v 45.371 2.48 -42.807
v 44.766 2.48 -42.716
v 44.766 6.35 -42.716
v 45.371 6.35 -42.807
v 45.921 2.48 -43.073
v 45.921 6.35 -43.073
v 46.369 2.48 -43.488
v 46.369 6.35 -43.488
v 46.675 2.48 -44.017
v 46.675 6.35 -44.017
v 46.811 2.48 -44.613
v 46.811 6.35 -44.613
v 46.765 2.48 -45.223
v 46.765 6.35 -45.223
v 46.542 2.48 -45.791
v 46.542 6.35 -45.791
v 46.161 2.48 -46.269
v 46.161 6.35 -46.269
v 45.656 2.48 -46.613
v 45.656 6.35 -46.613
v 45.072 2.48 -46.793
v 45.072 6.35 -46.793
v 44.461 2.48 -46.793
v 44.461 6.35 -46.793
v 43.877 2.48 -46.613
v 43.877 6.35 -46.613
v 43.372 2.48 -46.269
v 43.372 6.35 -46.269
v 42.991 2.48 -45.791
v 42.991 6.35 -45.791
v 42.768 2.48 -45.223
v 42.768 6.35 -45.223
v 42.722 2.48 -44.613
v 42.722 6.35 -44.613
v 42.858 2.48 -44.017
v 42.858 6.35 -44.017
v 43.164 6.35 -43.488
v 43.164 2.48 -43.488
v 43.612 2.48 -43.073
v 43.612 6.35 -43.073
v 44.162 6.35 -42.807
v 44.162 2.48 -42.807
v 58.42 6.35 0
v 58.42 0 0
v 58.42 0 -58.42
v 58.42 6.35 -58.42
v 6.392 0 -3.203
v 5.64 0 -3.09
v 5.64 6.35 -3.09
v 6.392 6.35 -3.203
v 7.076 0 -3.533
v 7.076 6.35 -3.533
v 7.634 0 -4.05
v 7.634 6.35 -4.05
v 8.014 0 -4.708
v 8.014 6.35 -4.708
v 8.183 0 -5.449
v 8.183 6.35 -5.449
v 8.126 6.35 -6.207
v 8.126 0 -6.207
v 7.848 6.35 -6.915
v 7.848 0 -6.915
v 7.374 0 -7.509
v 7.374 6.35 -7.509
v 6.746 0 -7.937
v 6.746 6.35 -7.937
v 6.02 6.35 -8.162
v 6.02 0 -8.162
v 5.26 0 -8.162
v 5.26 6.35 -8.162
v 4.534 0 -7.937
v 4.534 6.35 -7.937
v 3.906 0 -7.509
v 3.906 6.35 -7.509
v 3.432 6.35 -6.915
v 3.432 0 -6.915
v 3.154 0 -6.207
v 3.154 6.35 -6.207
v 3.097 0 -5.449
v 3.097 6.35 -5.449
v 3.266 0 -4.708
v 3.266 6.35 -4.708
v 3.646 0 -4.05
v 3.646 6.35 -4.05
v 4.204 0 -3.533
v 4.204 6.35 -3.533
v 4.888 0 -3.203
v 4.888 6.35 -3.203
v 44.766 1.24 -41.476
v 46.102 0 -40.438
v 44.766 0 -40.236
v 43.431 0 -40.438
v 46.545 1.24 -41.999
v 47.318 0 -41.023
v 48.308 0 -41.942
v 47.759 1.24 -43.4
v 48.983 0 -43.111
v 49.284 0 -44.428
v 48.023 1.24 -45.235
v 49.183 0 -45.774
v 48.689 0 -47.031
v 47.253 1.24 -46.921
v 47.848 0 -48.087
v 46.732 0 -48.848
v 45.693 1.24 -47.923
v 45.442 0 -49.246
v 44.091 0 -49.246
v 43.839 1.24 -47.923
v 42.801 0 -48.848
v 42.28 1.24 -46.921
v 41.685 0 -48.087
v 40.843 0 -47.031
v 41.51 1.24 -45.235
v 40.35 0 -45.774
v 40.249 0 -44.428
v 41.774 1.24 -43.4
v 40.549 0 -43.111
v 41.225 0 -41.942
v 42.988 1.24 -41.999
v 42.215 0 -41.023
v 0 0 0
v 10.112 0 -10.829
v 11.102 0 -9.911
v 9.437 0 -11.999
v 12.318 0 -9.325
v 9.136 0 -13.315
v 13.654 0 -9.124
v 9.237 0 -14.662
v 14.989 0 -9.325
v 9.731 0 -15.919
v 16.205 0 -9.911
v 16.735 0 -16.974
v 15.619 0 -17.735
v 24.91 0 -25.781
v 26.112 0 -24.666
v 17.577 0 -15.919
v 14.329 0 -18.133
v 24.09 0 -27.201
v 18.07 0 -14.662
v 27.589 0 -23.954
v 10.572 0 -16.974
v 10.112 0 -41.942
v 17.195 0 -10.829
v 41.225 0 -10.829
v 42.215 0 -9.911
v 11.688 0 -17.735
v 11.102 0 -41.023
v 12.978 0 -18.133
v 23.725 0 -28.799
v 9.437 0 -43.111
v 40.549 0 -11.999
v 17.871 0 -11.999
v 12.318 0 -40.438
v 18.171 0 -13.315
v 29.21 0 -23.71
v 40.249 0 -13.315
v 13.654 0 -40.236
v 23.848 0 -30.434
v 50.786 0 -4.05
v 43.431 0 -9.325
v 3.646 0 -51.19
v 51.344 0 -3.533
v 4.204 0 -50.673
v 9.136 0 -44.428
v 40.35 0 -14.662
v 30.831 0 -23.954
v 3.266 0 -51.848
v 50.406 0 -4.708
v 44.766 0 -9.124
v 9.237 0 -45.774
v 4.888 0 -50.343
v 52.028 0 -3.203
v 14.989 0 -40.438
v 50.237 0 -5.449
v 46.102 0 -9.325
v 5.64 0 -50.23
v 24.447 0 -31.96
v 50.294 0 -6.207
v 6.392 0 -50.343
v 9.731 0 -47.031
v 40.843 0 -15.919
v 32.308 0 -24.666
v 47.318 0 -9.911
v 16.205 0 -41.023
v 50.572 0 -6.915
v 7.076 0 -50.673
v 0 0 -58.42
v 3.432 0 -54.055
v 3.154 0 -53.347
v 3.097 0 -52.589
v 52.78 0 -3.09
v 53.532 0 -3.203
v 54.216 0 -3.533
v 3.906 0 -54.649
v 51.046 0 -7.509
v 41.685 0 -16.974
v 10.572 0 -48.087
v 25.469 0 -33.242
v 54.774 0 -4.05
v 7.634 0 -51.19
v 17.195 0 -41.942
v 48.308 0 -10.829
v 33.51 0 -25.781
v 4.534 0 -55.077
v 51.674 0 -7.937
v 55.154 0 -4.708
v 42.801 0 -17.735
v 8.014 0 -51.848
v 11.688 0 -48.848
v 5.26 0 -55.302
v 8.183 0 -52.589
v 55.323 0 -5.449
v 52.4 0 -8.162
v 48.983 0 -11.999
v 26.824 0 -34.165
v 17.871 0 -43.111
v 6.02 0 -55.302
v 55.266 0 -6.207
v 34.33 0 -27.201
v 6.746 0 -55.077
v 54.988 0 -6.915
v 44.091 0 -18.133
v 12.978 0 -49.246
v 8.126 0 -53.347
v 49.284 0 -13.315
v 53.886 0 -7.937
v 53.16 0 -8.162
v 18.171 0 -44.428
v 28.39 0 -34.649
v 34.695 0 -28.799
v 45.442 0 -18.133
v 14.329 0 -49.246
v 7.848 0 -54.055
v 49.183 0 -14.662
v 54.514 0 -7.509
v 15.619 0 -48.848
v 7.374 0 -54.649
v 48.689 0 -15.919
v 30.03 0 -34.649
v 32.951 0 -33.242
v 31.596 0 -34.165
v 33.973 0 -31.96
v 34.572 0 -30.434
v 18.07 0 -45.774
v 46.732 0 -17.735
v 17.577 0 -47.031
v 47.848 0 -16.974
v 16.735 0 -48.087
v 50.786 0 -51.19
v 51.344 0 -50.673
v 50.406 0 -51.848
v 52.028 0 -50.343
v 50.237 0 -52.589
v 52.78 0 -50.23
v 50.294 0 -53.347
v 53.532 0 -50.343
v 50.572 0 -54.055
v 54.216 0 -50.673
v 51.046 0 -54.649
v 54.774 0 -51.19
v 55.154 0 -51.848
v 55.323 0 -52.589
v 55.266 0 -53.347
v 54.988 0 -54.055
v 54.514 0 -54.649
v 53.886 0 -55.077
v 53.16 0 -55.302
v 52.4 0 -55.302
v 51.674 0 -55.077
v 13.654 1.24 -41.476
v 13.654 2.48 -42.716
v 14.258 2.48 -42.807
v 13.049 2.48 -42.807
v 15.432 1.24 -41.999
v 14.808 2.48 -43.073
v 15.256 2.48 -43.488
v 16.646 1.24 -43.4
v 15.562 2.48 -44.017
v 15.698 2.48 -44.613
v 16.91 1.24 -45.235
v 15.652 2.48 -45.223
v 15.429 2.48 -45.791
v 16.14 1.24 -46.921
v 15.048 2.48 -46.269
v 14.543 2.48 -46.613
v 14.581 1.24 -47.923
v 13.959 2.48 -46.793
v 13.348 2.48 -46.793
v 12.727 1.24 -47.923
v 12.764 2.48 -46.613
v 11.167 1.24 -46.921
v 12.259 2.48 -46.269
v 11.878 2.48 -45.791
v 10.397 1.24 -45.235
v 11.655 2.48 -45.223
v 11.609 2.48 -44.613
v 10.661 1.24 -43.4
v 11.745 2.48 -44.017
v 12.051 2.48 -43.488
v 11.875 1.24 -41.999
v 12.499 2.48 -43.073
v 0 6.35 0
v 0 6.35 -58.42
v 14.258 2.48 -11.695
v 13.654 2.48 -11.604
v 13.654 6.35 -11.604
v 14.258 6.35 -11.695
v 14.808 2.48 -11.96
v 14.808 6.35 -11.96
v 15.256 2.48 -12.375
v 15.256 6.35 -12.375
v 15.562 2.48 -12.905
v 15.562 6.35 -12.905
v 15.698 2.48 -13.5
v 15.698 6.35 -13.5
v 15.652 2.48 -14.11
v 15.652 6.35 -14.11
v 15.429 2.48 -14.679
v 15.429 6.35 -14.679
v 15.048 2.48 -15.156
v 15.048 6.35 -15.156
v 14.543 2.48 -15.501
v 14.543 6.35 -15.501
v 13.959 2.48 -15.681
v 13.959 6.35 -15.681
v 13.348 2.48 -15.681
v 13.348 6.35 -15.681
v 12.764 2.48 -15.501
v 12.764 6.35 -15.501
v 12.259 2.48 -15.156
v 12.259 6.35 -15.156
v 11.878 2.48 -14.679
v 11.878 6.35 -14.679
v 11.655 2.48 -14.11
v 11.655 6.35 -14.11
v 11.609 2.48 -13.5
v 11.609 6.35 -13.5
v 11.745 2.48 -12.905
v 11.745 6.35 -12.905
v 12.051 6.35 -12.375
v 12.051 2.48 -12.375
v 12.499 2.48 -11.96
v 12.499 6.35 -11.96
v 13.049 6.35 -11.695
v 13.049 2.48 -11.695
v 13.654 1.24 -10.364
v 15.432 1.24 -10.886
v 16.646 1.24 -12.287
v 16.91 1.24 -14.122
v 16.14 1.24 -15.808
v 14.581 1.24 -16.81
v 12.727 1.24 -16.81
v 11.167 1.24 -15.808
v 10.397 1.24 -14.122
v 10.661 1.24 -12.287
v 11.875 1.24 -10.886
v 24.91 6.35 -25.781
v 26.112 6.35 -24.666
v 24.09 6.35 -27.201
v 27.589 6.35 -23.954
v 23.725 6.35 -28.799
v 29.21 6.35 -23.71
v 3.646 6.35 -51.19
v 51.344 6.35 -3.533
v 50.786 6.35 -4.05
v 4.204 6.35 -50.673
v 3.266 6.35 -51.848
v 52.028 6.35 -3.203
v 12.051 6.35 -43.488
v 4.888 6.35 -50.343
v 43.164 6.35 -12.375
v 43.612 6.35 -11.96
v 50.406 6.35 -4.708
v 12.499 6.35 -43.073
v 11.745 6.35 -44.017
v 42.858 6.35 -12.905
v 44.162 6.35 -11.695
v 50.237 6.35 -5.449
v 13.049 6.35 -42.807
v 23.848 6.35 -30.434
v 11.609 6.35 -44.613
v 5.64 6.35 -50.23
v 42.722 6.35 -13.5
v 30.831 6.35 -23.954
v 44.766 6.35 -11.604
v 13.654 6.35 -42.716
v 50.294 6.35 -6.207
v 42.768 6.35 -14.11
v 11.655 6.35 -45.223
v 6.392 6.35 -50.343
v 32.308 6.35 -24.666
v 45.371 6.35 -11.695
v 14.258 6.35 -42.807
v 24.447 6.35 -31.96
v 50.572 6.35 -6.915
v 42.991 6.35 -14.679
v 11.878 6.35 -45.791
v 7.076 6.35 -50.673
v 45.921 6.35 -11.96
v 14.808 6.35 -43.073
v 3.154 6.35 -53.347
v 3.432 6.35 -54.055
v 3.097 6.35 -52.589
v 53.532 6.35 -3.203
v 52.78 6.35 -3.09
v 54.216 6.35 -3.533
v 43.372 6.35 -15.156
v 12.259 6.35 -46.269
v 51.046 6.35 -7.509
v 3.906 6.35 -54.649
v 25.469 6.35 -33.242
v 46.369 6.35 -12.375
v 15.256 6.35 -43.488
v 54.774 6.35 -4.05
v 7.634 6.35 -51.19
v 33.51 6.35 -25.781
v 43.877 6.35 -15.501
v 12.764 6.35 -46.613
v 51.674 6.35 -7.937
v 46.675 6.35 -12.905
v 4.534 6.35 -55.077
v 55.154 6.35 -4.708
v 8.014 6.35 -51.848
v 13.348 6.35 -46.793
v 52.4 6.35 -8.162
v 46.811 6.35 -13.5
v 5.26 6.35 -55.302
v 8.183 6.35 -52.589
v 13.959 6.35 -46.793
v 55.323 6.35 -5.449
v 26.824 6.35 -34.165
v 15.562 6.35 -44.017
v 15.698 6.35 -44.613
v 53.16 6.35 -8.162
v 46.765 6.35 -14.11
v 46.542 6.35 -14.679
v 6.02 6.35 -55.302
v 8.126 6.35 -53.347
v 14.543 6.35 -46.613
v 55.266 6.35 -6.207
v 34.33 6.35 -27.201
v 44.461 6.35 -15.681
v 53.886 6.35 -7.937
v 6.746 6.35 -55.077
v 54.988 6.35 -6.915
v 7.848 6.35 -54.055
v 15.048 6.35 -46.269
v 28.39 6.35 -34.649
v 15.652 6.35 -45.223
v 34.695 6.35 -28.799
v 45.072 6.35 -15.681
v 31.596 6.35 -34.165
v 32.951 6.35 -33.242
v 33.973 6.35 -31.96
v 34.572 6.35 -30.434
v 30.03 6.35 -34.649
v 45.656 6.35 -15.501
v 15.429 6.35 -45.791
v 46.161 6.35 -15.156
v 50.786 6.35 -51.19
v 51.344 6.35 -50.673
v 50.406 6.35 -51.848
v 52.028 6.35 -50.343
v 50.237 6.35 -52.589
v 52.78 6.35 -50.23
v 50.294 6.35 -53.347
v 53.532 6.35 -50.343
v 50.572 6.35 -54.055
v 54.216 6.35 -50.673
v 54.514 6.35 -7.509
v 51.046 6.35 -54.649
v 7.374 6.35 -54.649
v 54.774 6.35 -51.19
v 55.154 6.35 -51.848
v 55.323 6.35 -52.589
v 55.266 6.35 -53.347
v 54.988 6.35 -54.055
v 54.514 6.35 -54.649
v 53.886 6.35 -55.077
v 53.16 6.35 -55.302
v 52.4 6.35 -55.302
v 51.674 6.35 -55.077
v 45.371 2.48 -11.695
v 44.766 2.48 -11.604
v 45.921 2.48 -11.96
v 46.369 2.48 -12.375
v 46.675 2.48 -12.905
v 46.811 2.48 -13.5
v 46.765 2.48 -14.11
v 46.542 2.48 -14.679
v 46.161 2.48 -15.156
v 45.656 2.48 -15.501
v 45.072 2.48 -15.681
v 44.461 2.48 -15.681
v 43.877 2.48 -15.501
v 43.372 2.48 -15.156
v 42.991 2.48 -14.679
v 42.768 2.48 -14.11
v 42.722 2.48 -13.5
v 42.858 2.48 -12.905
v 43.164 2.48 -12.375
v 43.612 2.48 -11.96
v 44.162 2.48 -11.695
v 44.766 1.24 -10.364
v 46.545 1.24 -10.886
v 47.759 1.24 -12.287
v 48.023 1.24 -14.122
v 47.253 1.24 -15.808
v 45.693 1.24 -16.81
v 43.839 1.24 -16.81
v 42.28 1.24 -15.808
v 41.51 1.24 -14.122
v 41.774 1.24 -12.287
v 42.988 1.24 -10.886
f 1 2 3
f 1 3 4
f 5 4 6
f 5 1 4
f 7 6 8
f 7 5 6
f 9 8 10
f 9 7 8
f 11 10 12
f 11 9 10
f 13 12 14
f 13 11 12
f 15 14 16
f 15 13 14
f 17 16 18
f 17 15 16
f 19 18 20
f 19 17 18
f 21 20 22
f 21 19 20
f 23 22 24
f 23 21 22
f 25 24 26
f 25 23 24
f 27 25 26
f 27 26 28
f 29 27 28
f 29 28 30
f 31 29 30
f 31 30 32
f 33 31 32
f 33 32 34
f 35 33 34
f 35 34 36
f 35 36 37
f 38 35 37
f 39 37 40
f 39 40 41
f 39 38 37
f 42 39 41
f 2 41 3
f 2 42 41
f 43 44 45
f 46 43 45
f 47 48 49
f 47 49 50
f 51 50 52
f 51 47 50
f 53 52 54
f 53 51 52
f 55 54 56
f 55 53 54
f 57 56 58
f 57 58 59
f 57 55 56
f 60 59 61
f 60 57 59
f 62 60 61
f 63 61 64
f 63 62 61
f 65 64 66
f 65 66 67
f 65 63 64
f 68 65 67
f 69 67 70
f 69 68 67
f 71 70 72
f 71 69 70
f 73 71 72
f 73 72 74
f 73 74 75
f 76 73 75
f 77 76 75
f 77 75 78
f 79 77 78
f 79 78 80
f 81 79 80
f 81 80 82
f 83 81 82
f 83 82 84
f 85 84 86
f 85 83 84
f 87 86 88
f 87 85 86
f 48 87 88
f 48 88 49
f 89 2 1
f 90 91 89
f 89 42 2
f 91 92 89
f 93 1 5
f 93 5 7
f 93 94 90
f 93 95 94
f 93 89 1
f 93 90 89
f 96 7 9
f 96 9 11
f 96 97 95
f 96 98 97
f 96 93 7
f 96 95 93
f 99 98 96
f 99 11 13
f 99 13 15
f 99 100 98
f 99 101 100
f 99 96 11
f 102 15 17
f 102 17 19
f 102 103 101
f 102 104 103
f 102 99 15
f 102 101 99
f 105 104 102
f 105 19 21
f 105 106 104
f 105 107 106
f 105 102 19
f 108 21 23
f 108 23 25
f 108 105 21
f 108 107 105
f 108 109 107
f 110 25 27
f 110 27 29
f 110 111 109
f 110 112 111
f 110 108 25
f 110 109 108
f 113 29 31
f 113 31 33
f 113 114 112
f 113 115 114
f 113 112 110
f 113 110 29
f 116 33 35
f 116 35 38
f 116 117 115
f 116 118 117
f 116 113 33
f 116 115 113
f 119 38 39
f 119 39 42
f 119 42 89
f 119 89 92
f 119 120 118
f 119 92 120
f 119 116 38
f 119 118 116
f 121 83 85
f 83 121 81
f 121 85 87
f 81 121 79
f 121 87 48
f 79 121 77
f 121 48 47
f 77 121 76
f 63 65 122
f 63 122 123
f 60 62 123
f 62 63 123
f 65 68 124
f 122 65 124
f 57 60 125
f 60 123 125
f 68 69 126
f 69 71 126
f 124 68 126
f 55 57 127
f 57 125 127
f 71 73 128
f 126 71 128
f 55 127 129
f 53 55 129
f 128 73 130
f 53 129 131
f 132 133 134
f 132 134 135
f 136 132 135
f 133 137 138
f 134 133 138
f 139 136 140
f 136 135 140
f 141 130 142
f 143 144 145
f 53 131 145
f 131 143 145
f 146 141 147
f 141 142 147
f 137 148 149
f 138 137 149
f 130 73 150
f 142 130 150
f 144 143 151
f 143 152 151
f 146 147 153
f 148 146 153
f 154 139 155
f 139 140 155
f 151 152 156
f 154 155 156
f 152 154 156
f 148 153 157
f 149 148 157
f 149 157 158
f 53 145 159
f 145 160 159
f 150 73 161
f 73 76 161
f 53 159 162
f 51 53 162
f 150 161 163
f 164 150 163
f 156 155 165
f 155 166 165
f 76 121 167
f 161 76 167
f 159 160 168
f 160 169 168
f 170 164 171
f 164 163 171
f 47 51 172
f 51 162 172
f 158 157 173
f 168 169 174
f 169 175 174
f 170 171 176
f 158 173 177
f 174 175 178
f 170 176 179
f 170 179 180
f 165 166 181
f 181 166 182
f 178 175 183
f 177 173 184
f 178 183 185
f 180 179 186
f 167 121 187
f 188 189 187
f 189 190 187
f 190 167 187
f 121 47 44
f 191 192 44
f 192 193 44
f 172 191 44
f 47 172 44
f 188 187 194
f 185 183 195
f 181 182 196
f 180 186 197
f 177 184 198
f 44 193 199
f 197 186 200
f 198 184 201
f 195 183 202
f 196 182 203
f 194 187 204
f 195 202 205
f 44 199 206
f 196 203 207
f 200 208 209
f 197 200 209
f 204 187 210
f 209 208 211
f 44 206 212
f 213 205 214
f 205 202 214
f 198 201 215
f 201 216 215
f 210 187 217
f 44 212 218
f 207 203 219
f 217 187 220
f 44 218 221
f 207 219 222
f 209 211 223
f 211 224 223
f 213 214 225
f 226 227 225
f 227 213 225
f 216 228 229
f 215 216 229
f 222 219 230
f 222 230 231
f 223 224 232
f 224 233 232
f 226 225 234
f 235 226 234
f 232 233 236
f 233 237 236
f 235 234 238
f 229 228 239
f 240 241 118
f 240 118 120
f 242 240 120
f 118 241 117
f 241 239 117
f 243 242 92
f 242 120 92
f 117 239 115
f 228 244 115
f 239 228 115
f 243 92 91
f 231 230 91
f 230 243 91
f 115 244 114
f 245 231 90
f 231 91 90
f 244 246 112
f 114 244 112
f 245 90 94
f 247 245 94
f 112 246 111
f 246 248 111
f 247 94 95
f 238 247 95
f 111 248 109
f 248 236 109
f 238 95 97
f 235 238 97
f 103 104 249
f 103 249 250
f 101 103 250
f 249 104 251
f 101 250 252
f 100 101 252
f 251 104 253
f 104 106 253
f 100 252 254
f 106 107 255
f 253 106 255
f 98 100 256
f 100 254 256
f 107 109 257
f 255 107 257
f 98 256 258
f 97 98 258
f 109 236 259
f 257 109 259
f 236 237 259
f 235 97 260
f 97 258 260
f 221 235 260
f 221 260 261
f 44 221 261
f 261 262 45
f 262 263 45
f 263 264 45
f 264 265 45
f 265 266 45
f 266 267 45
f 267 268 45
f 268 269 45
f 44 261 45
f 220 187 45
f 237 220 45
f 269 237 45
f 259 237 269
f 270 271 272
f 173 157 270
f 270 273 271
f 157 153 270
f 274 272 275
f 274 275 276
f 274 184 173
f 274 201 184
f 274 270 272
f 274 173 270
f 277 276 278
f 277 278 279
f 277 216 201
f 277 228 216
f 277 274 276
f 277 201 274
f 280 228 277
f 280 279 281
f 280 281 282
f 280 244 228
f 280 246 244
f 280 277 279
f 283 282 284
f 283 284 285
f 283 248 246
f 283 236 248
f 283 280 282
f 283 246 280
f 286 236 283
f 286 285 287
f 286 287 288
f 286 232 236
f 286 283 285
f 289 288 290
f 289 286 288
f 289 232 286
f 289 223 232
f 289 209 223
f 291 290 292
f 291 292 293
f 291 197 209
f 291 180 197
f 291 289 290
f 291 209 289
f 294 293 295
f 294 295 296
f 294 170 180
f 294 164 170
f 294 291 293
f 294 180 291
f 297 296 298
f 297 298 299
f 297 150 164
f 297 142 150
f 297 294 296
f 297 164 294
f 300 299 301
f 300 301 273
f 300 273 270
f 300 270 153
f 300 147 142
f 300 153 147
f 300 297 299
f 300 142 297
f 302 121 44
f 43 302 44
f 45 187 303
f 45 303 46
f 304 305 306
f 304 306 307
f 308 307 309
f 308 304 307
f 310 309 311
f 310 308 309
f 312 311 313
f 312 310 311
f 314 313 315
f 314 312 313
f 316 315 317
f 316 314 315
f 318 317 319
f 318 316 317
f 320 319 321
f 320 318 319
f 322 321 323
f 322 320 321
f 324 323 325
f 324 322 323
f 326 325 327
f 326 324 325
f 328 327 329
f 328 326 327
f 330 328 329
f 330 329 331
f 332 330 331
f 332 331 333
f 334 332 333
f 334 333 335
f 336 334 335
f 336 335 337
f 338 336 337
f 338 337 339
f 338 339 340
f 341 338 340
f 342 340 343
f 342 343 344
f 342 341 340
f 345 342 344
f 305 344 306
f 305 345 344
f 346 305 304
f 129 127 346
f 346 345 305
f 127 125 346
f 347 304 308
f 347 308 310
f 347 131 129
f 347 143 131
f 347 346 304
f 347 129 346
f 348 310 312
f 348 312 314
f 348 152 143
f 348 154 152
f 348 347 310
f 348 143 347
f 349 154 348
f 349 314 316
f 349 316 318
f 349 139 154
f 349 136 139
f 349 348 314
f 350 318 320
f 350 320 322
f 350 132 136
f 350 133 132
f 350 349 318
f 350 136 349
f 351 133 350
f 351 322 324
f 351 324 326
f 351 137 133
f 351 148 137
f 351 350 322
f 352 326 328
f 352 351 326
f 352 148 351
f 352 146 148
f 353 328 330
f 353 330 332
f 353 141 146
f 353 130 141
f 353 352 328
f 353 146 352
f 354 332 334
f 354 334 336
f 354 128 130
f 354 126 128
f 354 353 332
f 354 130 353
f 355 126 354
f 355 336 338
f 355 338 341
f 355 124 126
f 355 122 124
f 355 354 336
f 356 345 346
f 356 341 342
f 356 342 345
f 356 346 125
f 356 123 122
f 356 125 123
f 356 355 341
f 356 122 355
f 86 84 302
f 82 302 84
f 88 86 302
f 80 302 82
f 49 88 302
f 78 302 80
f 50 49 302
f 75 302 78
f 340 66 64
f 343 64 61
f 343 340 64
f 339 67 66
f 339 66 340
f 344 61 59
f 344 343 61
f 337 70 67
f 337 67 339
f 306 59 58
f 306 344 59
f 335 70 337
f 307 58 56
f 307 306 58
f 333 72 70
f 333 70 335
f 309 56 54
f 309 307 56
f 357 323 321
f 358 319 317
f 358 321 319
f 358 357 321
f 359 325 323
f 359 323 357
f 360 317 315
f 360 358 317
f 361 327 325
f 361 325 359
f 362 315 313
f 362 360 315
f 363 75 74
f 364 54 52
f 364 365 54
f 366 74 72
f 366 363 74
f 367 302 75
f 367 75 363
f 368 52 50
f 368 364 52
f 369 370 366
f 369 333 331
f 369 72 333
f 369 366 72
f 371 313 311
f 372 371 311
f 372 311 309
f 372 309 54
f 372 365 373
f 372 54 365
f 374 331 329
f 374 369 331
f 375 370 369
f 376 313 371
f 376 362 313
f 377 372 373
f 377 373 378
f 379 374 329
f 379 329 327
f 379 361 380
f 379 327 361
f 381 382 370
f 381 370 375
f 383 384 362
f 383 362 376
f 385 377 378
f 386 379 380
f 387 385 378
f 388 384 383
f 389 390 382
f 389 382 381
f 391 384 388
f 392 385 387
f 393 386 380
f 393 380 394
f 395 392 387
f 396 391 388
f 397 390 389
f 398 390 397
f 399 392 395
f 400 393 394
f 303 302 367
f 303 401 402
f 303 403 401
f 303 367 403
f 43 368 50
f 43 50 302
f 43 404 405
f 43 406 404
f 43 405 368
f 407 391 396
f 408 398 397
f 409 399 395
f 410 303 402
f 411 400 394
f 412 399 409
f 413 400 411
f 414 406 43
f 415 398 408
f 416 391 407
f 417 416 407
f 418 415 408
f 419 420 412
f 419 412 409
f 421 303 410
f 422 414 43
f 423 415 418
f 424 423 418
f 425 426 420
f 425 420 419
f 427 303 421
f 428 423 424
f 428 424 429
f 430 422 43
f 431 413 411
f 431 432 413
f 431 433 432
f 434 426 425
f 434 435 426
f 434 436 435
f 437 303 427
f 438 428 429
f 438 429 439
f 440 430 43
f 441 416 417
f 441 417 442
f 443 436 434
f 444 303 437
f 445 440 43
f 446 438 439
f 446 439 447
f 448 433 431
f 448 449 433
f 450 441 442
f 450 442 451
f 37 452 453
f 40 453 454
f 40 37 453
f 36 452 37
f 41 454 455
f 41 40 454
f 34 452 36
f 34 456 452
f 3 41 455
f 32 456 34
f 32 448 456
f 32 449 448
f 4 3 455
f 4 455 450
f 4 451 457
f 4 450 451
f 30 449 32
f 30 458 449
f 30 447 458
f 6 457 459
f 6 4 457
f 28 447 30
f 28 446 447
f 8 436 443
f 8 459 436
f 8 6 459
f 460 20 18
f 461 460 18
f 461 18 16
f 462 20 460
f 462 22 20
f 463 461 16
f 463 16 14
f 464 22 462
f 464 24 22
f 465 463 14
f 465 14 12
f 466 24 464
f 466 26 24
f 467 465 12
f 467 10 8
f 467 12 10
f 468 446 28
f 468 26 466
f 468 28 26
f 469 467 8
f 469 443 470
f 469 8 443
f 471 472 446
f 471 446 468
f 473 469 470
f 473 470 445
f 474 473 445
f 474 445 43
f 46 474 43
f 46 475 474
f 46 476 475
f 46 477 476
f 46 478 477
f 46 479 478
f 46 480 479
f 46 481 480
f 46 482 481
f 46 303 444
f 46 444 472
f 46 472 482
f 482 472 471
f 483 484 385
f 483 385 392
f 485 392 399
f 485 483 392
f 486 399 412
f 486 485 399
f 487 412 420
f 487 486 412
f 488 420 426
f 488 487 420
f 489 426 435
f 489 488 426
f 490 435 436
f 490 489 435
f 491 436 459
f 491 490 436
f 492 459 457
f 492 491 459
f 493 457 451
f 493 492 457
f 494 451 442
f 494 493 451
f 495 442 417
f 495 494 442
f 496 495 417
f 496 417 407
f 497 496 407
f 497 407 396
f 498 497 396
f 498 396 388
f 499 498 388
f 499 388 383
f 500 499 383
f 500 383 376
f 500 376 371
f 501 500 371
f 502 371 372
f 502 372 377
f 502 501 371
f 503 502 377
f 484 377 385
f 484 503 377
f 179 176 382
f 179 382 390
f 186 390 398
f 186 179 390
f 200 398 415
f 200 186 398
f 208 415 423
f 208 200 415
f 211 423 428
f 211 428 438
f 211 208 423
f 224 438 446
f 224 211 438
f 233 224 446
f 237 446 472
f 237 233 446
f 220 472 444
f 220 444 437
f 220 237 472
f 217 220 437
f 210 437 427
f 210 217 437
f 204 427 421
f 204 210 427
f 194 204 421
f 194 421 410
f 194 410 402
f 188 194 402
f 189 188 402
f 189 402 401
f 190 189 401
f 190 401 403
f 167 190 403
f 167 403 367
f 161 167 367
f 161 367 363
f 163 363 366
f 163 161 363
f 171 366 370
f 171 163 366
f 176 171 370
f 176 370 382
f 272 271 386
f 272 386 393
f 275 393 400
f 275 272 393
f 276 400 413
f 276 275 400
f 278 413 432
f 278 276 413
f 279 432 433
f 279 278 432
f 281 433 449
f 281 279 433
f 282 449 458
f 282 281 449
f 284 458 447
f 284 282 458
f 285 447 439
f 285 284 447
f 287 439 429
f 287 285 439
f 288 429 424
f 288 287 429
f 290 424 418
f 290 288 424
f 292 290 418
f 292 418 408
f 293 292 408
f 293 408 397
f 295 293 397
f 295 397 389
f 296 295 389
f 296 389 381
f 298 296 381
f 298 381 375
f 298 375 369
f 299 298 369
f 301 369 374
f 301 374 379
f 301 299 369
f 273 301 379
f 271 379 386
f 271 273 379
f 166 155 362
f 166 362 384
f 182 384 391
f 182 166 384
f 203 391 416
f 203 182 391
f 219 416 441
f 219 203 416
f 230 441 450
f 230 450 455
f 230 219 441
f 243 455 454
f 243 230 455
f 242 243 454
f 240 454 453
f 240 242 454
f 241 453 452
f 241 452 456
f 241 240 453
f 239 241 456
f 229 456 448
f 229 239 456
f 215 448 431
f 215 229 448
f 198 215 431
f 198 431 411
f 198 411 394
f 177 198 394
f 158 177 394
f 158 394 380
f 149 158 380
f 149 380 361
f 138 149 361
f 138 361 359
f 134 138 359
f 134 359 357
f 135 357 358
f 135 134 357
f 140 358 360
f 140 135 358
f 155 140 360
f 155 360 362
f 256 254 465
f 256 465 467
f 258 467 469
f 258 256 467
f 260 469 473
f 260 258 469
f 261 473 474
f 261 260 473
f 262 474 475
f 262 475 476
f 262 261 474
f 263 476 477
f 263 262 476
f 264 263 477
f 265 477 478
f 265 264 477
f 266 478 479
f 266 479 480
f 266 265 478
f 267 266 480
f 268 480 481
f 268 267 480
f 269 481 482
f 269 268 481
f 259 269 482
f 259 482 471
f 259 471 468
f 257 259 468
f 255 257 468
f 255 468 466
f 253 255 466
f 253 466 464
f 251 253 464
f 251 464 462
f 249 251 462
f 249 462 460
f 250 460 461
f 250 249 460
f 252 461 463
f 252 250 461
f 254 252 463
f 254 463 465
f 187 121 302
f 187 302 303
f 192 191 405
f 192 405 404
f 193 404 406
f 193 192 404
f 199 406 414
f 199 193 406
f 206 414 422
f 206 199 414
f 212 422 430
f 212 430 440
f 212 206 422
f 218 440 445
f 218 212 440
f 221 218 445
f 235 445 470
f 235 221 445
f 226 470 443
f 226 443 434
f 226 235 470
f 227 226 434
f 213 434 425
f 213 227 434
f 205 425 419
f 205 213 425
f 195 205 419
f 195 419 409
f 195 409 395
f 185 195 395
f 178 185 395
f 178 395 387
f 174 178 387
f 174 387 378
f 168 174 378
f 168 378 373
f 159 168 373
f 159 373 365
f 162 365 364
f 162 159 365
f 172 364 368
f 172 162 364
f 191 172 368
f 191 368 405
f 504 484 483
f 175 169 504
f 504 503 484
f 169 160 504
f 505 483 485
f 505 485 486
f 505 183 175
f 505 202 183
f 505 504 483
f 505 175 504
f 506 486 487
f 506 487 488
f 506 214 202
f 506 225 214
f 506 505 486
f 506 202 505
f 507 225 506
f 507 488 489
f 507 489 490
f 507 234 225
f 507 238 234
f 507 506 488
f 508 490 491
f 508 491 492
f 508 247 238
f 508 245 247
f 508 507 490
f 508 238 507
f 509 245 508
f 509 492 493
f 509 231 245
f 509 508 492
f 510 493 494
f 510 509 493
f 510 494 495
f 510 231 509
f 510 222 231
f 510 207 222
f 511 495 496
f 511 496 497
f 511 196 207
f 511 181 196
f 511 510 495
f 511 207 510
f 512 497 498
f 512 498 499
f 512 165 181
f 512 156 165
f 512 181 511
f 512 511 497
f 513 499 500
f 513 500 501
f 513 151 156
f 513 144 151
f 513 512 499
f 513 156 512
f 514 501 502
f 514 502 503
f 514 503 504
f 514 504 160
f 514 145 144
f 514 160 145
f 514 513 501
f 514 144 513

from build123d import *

# Parameters (mm, degrees)
SKETCH1_W           = 58.42
SKETCH1_H           = 58.42
SKETCH1_R           = 2.55
SKETCH1_R_2         = 5.5
SKETCH1_R_3         = 2.05
BOSS_EXTRUDE1_DEPTH = 6.35
CHAMFER1_SIZE       = 2.48


with BuildPart() as part:
    # Sketch1 → Boss-Extrude1 (new body)
    with BuildSketch(Plane(origin=(0, 0, 0), x_dir=(1, 0, 0), z_dir=(0, 1, 0))):
        with Locations((29.21, 29.21)):
            Rectangle(SKETCH1_W, SKETCH1_H)
        with Locations(Location((5.64, 52.78, 0), (0, 0, 270))):
            Circle(SKETCH1_R, mode=Mode.SUBTRACT)
        with Locations(Location((52.78, 52.78, 0), (0, 0, 270))):
            Circle(SKETCH1_R, mode=Mode.SUBTRACT)
        with Locations(Location((52.78, 5.64, 0), (0, 0, 270))):
            Circle(SKETCH1_R, mode=Mode.SUBTRACT)
        with Locations(Location((5.64, 5.64, 0), (0, 0, 270))):
            Circle(SKETCH1_R, mode=Mode.SUBTRACT)
        with Locations(Location((29.21, 29.21, 0), (0, 0, 270))):
            Circle(SKETCH1_R_2, mode=Mode.SUBTRACT)
        with Locations(Location((13.653650814, 44.766349186, 0), (0, 0, 270))):
            Circle(SKETCH1_R_3, mode=Mode.SUBTRACT)
        with Locations(Location((44.766349186, 44.766349186, 0), (0, 0, 270))):
            Circle(SKETCH1_R_3, mode=Mode.SUBTRACT)
        with Locations(Location((44.766349186, 13.653650814, 0), (0, 0, 270))):
            Circle(SKETCH1_R_3, mode=Mode.SUBTRACT)
        with Locations(Location((13.653650814, 13.653650814, 0), (0, 0, 270))):
            Circle(SKETCH1_R_3, mode=Mode.SUBTRACT)
    extrude(amount=BOSS_EXTRUDE1_DEPTH)

    # Chamfer1
    chamfer1_edges = [part.edges().sort_by_distance(p)[0] for p in [
        (13.653650814, 0, -46.816349186),
        (44.766349186, 0, -46.816349186),
        (44.766349186, 0, -15.703650814),
        (13.653650814, 0, -15.703650814),
    ]]
    chamfer(chamfer1_edges, length=CHAMFER1_SIZE)


solid = part.part
